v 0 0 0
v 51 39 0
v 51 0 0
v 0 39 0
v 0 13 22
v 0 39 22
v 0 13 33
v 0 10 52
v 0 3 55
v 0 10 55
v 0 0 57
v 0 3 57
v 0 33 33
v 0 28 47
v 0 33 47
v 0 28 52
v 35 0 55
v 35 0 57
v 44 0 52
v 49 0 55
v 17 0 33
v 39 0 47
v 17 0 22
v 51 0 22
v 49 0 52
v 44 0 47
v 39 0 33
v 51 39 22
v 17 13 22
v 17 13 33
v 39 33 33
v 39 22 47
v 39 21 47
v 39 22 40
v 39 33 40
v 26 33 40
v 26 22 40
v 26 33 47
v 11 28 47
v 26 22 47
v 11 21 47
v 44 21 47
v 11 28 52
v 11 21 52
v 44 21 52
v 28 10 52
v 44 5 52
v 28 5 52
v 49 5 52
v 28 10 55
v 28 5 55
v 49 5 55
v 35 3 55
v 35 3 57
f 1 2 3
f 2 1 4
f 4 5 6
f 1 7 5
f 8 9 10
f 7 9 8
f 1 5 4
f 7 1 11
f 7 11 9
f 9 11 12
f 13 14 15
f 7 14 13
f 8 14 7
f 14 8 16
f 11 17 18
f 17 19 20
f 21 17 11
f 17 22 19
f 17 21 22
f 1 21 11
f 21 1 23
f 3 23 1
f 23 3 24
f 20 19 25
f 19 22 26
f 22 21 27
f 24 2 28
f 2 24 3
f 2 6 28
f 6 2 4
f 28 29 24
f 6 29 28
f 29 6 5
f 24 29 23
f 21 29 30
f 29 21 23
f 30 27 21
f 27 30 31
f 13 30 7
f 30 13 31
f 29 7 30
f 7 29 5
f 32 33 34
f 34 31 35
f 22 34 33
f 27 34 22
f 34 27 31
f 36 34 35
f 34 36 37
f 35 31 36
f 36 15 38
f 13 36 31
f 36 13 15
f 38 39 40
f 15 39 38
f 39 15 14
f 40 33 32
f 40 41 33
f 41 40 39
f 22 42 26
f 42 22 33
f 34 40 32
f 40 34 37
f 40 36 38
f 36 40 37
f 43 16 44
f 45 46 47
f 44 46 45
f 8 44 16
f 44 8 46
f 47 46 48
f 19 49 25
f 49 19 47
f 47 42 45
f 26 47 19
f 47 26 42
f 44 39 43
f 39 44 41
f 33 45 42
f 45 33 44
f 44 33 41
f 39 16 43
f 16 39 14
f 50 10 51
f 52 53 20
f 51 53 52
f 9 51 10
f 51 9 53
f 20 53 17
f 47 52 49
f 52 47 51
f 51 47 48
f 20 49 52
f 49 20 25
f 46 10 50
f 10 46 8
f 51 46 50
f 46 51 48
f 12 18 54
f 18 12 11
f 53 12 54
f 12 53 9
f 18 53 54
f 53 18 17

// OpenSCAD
translate([8.5, 6.5, 5.5]) color([0.6084990843462054, 0.1325407149567407, 0.4984659545183915]) cube([17, 13, 11], center=true);
translate([25.5, 6.5, 5.5]) color([0.9178662904203972, 0.6160167741323543, 0.02601445858505036]) cube([17, 13, 11], center=true);
translate([42.5, 6.5, 5.5]) color([0.596125612844632, 0.48919913512172475, 0.30869925031539414]) cube([17, 13, 11], center=true);
translate([8.5, 19.5, 5.5]) color([0.9586301909392594, 0.5555224541780607, 0.16303723797834868]) cube([17, 13, 11], center=true);
translate([25.5, 19.5, 5.5]) color([0.8790785483620981, 0.8092366229990562, 0.7373715302416316]) cube([17, 13, 11], center=true);
translate([42.5, 19.5, 5.5]) color([0.5460288399006699, 0.7042240787132147, 0.07877233817546292]) cube([17, 13, 11], center=true);
translate([8.5, 32.5, 5.5]) color([0.13744427713979768, 0.40185422229333856, 0.1910666288561843]) cube([17, 13, 11], center=true);
translate([25.5, 32.5, 5.5]) color([0.31642065037316636, 0.2917281417853558, 0.9437754009602987]) cube([17, 13, 11], center=true);
translate([42.5, 32.5, 5.5]) color([0.20866341172373193, 0.3151573145870893, 0.7470721078045024]) cube([17, 13, 11], center=true);
translate([8.5, 6.5, 16.5]) color([0.24960896628473228, 0.8629627260654799, 0.6684326881602258]) cube([17, 13, 11], center=true);
translate([25.5, 6.5, 16.5]) color([0.6597695027130189, 0.22591717735012307, 0.3441717078654829]) cube([17, 13, 11], center=true);
translate([42.5, 6.5, 16.5]) color([0.16233220178561225, 0.01697652307419406, 0.5735931064152219]) cube([17, 13, 11], center=true);
translate([8.5, 19.5, 16.5]) color([0.05818297514553228, 0.6304378073753134, 0.35341956482818127]) cube([17, 13, 11], center=true);
translate([25.5, 19.5, 16.5]) color([0.49110709598533775, 0.06132304686728618, 0.24146702174069912]) cube([17, 13, 11], center=true);
translate([42.5, 19.5, 16.5]) color([0.012441234482642782, 0.9455344576677447, 0.3266678829978785]) cube([17, 13, 11], center=true);
translate([8.5, 32.5, 16.5]) color([0.820956849026723, 0.34492851027915805, 0.6639756368298299]) cube([17, 13, 11], center=true);
translate([25.5, 32.5, 16.5]) color([0.13585073420724958, 0.9219835342207869, 0.44896684911260887]) cube([17, 13, 11], center=true);
translate([42.5, 32.5, 16.5]) color([0.1420549627992148, 0.3119518323014343, 0.6490756968320398]) cube([17, 13, 11], center=true);
translate([8.5, 6.5, 27.5]) color([0.7280642389267371, 0.7852833252199665, 0.40863068686923587]) cube([17, 13, 11], center=true);
translate([6.5, 5.5, 36.5]) color([0.009633238682779877, 0.8909238596539266, 0.533705581213062]) cube([13, 11, 7], center=true);
translate([19.5, 5.5, 36.5]) color([0.8046005274030336, 0.9806276909012095, 0.7049346898693578]) cube([13, 11, 7], center=true);
translate([32.5, 5.5, 36.5]) color([0.7590860206033218, 0.5647284680717275, 0.12259546226958773]) cube([13, 11, 7], center=true);
translate([6.5, 16.5, 36.5]) color([0.9539533584587191, 0.1713156178825357, 0.5005542720722199]) cube([13, 11, 7], center=true);
translate([19.5, 16.5, 36.5]) color([0.621843985236089, 0.6619765424276485, 0.8400519693824264]) cube([13, 11, 7], center=true);
translate([32.5, 16.5, 36.5]) color([0.699601591737329, 0.07964741684534404, 0.23738047361475634]) cube([13, 11, 7], center=true);
translate([6.5, 27.5, 36.5]) color([0.8282556520451495, 0.1762738246231843, 0.9459581227747745]) cube([13, 11, 7], center=true);
translate([19.5, 27.5, 36.5]) color([0.9565644324307663, 0.8963269305888116, 0.7428117304122551]) cube([13, 11, 7], center=true);
translate([32.5, 27.5, 36.5]) color([0.8383436924491765, 0.5614087817692366, 0.7177928021437573]) cube([13, 11, 7], center=true);
translate([6.5, 5.5, 43.5]) color([0.4271772721979724, 0.8646648421725511, 0.10365846470378459]) cube([13, 11, 7], center=true);
translate([19.5, 5.5, 43.5]) color([0.6285317276232824, 0.7101075213407797, 0.6149371087697887]) cube([13, 11, 7], center=true);
translate([32.5, 5.5, 43.5]) color([0.0400488022899097, 0.34025031183581533, 0.7380159626358669]) cube([13, 11, 7], center=true);
translate([6.5, 16.5, 43.5]) color([0.3765176313166855, 0.6257641682954356, 0.8894786539399329]) cube([13, 11, 7], center=true);
translate([19.5, 16.5, 43.5]) color([0.4963449395419606, 0.3583651728386771, 0.6716454412848432]) cube([13, 11, 7], center=true);
translate([32.5, 16.5, 43.5]) color([0.45811681625355094, 0.5074379917667022, 0.16228475224599026]) cube([13, 11, 7], center=true);
translate([6.5, 27.5, 43.5]) color([0.7529781863444399, 0.3376457636791449, 0.8033239356600728]) cube([13, 11, 7], center=true);
translate([19.5, 27.5, 43.5]) color([0.9444207727357242, 0.014783921172948133, 0.5303420268039528]) cube([13, 11, 7], center=true);
translate([5.5, 3.5, 49.5]) color([0.2882277186993394, 0.4689175335863792, 0.03492832759702502]) cube([11, 7, 5], center=true);
translate([16.5, 3.5, 49.5]) color([0.5317931441254861, 0.552095437515129, 0.9340898594770107]) cube([11, 7, 5], center=true);
translate([27.5, 3.5, 49.5]) color([0.03830085289416996, 0.3950652682884612, 0.1200155720396251]) cube([11, 7, 5], center=true);
translate([38.5, 3.5, 49.5]) color([0.34658884626630715, 0.051152415727703016, 0.2730496953424699]) cube([11, 7, 5], center=true);
translate([5.5, 10.5, 49.5]) color([0.9956802504828091, 0.25391998649183944, 0.6803935586065328]) cube([11, 7, 5], center=true);
translate([16.5, 10.5, 49.5]) color([0.7027090324157298, 0.9291230685247301, 0.9949404722907454]) cube([11, 7, 5], center=true);
translate([27.5, 10.5, 49.5]) color([0.7620813713006523, 0.7625973189567923, 0.5162610213479427]) cube([11, 7, 5], center=true);
translate([38.5, 10.5, 49.5]) color([0.3860717563215982, 0.8343975914408754, 0.2506337702942619]) cube([11, 7, 5], center=true);
translate([5.5, 17.5, 49.5]) color([0.11599539642064438, 0.9817240858781537, 0.8047994372884794]) cube([11, 7, 5], center=true);
translate([16.5, 17.5, 49.5]) color([0.9431012043694105, 0.24264659424234813, 0.6738638931519124]) cube([11, 7, 5], center=true);
translate([27.5, 17.5, 49.5]) color([0.5327800265053269, 0.8756440829735669, 0.16255101499230828]) cube([11, 7, 5], center=true);
translate([38.5, 17.5, 49.5]) color([0.8680483691353614, 0.15305579700066485, 0.8462165202751376]) cube([11, 7, 5], center=true);
translate([5.5, 24.5, 49.5]) color([0.8200801239095041, 0.5849326984313064, 0.05125489506773162]) cube([11, 7, 5], center=true);
translate([3.5, 2.5, 53.5]) color([0.156166769208809, 0.34458118202681143, 0.291190613997825]) cube([7, 5, 3], center=true);
translate([10.5, 2.5, 53.5]) color([0.29342424365134856, 0.49485912757206985, 0.40365829021262367]) cube([7, 5, 3], center=true);
translate([17.5, 2.5, 53.5]) color([0.43100562682353716, 0.17003546655932655, 0.788340085303476]) cube([7, 5, 3], center=true);
translate([24.5, 2.5, 53.5]) color([0.5686027559906347, 0.44188886974638586, 0.3413461590512491]) cube([7, 5, 3], center=true);
translate([31.5, 2.5, 53.5]) color([0.009317740415098474, 0.72162474304745, 0.9099060293040379]) cube([7, 5, 3], center=true);
translate([38.5, 2.5, 53.5]) color([0.6642090292154819, 0.6628365798191557, 0.2575988974219705]) cube([7, 5, 3], center=true);
translate([45.5, 2.5, 53.5]) color([0.6122127561841502, 0.07024606726227145, 0.936077955543095]) cube([7, 5, 3], center=true);
translate([3.5, 7.5, 53.5]) color([0.27870721332570936, 0.8301443917589898, 0.5295296249528143]) cube([7, 5, 3], center=true);
translate([10.5, 7.5, 53.5]) color([0.06328696503387199, 0.639390097241117, 0.579686955437464]) cube([7, 5, 3], center=true);
translate([17.5, 7.5, 53.5]) color([0.9416538141960143, 0.6321291610349786, 0.5434228748459046]) cube([7, 5, 3], center=true);
translate([24.5, 7.5, 53.5]) color([0.38469874676133664, 0.434637548519362, 0.31139777068021024]) cube([7, 5, 3], center=true);
translate([2.5, 1.5, 56.0]) color([0.01363511702942577, 0.7785312160167684, 0.8197509625398982]) cube([5, 3, 2], center=true);
translate([7.5, 1.5, 56.0]) color([0.28044077713976767, 0.2581907625337724, 0.5272652548146236]) cube([5, 3, 2], center=true);
translate([12.5, 1.5, 56.0]) color([0.3179301097250754, 0.3422638341038545, 0.7055726929201963]) cube([5, 3, 2], center=true);
translate([17.5, 1.5, 56.0]) color([0.43169639849300545, 0.14170724037842175, 0.0059275683019511805]) cube([5, 3, 2], center=true);
translate([22.5, 1.5, 56.0]) color([0.5113413643489257, 0.7846494738841625, 0.7013909140505133]) cube([5, 3, 2], center=true);
translate([27.5, 1.5, 56.0]) color([0.7815279332048084, 0.38414456219182536, 0.4641305725985776]) cube([5, 3, 2], center=true);
translate([32.5, 1.5, 56.0]) color([0.036369164001931575, 0.9124290899309246, 0.6366653413633517]) cube([5, 3, 2], center=true);
